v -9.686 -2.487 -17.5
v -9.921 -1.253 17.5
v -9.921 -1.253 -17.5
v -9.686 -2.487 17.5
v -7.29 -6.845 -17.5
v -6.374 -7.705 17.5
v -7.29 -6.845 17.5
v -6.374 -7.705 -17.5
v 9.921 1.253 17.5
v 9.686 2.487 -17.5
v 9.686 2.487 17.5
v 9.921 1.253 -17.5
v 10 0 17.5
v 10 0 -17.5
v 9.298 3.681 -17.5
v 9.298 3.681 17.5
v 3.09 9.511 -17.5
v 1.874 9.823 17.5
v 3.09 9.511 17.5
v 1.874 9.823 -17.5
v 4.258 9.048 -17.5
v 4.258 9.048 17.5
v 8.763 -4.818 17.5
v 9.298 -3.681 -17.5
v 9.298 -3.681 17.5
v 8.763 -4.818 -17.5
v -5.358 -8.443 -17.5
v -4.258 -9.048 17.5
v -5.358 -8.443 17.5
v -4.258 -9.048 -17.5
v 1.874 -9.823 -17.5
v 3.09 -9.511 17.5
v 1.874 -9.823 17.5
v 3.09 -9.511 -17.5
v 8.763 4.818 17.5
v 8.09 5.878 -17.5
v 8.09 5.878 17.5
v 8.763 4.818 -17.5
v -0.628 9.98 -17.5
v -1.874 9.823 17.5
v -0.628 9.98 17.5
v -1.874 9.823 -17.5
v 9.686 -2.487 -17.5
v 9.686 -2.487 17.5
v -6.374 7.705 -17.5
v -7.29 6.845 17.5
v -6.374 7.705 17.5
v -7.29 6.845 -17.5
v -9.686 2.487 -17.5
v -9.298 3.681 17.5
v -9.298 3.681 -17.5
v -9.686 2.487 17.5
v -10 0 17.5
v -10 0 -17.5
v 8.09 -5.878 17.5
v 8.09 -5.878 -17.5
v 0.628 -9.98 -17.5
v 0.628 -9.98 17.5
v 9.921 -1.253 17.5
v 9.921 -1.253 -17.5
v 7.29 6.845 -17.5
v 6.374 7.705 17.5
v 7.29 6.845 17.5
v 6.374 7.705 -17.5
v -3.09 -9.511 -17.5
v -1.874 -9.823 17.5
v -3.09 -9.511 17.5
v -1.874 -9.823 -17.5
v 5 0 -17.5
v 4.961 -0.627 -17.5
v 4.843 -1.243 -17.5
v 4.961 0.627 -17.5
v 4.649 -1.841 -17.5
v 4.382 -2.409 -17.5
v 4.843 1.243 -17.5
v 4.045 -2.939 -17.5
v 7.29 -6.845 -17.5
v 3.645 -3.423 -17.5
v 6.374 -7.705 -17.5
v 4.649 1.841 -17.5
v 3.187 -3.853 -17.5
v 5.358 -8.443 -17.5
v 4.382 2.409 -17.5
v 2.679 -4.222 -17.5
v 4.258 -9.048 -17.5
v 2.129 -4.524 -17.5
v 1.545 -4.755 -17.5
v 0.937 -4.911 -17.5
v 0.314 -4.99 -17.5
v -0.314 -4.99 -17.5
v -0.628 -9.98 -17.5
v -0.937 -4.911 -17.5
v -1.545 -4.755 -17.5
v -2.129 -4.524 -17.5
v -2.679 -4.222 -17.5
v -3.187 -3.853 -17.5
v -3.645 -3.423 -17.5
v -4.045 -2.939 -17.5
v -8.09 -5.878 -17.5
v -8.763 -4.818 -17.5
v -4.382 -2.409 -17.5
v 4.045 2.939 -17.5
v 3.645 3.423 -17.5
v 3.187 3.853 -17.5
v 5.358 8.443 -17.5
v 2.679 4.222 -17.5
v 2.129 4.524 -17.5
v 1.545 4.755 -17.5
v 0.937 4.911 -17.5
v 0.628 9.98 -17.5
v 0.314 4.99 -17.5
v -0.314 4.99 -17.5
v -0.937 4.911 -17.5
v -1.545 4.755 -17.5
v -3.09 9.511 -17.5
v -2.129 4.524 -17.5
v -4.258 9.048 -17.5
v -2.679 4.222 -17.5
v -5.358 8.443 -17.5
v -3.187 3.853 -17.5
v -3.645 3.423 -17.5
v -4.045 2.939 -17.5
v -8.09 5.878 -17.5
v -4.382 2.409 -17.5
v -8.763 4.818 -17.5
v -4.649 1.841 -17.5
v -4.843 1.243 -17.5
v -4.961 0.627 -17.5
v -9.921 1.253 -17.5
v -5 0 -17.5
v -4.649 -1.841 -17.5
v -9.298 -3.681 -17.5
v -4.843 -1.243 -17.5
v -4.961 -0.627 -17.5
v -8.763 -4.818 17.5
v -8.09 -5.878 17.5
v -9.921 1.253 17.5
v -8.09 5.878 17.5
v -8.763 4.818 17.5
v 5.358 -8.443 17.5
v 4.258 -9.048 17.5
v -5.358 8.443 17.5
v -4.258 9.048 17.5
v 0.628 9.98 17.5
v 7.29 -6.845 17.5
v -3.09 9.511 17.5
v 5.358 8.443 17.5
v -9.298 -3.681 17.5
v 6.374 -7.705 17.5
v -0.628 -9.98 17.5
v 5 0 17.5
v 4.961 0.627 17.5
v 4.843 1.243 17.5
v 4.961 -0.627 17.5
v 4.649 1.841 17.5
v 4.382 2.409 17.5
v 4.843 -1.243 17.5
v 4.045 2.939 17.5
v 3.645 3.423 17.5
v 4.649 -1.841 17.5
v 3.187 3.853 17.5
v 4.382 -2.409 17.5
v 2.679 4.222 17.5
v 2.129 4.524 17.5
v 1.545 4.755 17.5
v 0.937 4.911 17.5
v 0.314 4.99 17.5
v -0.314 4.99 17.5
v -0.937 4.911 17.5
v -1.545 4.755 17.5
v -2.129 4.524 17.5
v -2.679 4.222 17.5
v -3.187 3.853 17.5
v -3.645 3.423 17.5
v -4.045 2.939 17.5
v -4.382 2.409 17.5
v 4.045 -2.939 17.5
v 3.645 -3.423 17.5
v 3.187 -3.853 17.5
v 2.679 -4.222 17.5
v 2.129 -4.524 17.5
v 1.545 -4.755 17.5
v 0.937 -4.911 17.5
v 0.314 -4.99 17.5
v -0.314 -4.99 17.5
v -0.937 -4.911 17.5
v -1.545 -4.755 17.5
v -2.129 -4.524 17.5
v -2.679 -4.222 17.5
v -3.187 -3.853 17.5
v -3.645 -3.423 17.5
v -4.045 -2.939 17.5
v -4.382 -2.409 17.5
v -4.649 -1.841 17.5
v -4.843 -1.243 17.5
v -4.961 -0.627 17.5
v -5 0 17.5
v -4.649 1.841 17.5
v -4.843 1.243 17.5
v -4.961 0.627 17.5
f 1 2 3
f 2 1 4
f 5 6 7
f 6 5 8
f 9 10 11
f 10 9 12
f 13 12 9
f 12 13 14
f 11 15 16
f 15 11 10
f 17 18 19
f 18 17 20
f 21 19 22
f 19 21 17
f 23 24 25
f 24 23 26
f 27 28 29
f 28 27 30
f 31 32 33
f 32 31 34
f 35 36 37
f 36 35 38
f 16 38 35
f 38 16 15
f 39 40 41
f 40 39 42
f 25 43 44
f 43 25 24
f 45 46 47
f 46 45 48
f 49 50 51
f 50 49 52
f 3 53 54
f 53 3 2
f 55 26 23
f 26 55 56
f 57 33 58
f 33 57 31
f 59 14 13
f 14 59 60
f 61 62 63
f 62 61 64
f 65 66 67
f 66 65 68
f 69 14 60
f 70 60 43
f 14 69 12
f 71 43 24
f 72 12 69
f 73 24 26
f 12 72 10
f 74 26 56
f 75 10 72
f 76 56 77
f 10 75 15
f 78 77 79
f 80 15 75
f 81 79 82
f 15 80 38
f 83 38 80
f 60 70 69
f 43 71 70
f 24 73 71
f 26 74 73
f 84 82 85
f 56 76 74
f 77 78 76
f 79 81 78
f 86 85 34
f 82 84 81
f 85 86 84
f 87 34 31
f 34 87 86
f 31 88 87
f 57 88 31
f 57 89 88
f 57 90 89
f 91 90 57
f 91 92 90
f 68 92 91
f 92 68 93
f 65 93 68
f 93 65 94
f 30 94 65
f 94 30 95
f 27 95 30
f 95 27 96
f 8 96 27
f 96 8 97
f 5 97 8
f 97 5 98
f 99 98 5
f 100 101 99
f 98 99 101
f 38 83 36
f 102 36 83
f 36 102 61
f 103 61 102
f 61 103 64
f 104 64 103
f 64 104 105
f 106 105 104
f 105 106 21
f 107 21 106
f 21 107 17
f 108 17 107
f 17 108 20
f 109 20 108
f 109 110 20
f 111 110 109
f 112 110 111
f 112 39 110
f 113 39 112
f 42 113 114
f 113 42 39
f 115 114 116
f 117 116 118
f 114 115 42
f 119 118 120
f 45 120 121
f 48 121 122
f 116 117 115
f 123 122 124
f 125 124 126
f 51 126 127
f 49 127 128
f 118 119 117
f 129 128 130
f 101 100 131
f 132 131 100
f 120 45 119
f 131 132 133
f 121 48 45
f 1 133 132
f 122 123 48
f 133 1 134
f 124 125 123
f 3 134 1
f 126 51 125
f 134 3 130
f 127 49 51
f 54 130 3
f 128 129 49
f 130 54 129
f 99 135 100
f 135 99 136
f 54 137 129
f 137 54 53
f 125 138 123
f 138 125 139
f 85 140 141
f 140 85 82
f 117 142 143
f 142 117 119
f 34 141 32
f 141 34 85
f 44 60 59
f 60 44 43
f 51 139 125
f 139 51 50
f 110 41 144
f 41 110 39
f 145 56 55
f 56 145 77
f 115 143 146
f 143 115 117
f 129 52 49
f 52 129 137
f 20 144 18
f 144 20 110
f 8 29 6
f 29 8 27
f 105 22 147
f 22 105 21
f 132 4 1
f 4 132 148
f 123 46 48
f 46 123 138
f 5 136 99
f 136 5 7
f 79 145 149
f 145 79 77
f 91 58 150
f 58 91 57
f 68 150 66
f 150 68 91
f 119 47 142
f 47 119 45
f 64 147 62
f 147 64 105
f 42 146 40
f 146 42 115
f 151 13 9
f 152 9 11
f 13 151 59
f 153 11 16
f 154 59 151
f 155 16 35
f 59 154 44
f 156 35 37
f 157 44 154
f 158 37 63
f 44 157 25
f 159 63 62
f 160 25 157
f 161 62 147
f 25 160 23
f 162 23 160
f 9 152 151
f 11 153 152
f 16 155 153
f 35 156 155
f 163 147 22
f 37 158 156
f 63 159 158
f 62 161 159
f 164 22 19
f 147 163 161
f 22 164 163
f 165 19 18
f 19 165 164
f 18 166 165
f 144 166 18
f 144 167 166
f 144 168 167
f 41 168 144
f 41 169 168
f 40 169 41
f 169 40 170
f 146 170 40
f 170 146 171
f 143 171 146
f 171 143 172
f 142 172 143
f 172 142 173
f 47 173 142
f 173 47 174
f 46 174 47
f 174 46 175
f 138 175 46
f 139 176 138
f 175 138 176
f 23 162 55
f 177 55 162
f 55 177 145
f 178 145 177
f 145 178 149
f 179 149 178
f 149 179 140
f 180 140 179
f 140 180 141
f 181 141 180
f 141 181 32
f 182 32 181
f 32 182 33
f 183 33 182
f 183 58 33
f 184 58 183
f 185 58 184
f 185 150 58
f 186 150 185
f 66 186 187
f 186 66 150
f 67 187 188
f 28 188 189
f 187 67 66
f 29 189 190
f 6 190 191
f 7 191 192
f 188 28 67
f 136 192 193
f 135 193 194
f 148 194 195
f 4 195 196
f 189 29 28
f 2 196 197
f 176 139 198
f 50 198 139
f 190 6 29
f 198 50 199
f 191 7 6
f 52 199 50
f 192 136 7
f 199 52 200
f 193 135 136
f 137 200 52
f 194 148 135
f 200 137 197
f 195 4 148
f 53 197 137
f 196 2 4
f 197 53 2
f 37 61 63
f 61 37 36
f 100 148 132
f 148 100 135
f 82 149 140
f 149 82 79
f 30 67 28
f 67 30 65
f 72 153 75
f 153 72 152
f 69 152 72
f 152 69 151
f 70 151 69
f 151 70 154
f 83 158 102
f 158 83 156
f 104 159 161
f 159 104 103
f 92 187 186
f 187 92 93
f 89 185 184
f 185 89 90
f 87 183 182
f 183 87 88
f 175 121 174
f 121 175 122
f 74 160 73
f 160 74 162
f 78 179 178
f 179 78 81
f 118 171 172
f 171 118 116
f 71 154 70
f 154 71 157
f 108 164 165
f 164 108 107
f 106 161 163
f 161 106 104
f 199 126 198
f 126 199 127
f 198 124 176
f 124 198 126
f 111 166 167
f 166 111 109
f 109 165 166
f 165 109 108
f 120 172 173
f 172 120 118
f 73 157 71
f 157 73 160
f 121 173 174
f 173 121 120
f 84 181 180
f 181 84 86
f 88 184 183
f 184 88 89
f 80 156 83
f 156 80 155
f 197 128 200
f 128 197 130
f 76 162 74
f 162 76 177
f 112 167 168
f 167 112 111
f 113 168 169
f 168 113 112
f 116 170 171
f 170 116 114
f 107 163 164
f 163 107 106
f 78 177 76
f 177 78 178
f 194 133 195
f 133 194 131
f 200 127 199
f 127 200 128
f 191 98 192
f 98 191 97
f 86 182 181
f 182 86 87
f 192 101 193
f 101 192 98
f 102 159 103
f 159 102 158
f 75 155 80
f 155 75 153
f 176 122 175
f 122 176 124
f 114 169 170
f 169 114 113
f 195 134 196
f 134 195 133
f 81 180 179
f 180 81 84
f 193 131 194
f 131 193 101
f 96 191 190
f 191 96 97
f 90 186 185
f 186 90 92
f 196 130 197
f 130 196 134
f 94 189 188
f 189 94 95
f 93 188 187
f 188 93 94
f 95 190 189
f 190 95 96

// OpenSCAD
$fn = 50;


difference() {
	union() {
		translate(v = [0, 0, -17.5000000000]) {
			cylinder(h = 35, r = 10.0000000000);
		}
	}
	union() {
		translate(v = [0, 0, -100.0000000000]) {
			cylinder(h = 200, r = 5.0000000000);
		}
	}
}
